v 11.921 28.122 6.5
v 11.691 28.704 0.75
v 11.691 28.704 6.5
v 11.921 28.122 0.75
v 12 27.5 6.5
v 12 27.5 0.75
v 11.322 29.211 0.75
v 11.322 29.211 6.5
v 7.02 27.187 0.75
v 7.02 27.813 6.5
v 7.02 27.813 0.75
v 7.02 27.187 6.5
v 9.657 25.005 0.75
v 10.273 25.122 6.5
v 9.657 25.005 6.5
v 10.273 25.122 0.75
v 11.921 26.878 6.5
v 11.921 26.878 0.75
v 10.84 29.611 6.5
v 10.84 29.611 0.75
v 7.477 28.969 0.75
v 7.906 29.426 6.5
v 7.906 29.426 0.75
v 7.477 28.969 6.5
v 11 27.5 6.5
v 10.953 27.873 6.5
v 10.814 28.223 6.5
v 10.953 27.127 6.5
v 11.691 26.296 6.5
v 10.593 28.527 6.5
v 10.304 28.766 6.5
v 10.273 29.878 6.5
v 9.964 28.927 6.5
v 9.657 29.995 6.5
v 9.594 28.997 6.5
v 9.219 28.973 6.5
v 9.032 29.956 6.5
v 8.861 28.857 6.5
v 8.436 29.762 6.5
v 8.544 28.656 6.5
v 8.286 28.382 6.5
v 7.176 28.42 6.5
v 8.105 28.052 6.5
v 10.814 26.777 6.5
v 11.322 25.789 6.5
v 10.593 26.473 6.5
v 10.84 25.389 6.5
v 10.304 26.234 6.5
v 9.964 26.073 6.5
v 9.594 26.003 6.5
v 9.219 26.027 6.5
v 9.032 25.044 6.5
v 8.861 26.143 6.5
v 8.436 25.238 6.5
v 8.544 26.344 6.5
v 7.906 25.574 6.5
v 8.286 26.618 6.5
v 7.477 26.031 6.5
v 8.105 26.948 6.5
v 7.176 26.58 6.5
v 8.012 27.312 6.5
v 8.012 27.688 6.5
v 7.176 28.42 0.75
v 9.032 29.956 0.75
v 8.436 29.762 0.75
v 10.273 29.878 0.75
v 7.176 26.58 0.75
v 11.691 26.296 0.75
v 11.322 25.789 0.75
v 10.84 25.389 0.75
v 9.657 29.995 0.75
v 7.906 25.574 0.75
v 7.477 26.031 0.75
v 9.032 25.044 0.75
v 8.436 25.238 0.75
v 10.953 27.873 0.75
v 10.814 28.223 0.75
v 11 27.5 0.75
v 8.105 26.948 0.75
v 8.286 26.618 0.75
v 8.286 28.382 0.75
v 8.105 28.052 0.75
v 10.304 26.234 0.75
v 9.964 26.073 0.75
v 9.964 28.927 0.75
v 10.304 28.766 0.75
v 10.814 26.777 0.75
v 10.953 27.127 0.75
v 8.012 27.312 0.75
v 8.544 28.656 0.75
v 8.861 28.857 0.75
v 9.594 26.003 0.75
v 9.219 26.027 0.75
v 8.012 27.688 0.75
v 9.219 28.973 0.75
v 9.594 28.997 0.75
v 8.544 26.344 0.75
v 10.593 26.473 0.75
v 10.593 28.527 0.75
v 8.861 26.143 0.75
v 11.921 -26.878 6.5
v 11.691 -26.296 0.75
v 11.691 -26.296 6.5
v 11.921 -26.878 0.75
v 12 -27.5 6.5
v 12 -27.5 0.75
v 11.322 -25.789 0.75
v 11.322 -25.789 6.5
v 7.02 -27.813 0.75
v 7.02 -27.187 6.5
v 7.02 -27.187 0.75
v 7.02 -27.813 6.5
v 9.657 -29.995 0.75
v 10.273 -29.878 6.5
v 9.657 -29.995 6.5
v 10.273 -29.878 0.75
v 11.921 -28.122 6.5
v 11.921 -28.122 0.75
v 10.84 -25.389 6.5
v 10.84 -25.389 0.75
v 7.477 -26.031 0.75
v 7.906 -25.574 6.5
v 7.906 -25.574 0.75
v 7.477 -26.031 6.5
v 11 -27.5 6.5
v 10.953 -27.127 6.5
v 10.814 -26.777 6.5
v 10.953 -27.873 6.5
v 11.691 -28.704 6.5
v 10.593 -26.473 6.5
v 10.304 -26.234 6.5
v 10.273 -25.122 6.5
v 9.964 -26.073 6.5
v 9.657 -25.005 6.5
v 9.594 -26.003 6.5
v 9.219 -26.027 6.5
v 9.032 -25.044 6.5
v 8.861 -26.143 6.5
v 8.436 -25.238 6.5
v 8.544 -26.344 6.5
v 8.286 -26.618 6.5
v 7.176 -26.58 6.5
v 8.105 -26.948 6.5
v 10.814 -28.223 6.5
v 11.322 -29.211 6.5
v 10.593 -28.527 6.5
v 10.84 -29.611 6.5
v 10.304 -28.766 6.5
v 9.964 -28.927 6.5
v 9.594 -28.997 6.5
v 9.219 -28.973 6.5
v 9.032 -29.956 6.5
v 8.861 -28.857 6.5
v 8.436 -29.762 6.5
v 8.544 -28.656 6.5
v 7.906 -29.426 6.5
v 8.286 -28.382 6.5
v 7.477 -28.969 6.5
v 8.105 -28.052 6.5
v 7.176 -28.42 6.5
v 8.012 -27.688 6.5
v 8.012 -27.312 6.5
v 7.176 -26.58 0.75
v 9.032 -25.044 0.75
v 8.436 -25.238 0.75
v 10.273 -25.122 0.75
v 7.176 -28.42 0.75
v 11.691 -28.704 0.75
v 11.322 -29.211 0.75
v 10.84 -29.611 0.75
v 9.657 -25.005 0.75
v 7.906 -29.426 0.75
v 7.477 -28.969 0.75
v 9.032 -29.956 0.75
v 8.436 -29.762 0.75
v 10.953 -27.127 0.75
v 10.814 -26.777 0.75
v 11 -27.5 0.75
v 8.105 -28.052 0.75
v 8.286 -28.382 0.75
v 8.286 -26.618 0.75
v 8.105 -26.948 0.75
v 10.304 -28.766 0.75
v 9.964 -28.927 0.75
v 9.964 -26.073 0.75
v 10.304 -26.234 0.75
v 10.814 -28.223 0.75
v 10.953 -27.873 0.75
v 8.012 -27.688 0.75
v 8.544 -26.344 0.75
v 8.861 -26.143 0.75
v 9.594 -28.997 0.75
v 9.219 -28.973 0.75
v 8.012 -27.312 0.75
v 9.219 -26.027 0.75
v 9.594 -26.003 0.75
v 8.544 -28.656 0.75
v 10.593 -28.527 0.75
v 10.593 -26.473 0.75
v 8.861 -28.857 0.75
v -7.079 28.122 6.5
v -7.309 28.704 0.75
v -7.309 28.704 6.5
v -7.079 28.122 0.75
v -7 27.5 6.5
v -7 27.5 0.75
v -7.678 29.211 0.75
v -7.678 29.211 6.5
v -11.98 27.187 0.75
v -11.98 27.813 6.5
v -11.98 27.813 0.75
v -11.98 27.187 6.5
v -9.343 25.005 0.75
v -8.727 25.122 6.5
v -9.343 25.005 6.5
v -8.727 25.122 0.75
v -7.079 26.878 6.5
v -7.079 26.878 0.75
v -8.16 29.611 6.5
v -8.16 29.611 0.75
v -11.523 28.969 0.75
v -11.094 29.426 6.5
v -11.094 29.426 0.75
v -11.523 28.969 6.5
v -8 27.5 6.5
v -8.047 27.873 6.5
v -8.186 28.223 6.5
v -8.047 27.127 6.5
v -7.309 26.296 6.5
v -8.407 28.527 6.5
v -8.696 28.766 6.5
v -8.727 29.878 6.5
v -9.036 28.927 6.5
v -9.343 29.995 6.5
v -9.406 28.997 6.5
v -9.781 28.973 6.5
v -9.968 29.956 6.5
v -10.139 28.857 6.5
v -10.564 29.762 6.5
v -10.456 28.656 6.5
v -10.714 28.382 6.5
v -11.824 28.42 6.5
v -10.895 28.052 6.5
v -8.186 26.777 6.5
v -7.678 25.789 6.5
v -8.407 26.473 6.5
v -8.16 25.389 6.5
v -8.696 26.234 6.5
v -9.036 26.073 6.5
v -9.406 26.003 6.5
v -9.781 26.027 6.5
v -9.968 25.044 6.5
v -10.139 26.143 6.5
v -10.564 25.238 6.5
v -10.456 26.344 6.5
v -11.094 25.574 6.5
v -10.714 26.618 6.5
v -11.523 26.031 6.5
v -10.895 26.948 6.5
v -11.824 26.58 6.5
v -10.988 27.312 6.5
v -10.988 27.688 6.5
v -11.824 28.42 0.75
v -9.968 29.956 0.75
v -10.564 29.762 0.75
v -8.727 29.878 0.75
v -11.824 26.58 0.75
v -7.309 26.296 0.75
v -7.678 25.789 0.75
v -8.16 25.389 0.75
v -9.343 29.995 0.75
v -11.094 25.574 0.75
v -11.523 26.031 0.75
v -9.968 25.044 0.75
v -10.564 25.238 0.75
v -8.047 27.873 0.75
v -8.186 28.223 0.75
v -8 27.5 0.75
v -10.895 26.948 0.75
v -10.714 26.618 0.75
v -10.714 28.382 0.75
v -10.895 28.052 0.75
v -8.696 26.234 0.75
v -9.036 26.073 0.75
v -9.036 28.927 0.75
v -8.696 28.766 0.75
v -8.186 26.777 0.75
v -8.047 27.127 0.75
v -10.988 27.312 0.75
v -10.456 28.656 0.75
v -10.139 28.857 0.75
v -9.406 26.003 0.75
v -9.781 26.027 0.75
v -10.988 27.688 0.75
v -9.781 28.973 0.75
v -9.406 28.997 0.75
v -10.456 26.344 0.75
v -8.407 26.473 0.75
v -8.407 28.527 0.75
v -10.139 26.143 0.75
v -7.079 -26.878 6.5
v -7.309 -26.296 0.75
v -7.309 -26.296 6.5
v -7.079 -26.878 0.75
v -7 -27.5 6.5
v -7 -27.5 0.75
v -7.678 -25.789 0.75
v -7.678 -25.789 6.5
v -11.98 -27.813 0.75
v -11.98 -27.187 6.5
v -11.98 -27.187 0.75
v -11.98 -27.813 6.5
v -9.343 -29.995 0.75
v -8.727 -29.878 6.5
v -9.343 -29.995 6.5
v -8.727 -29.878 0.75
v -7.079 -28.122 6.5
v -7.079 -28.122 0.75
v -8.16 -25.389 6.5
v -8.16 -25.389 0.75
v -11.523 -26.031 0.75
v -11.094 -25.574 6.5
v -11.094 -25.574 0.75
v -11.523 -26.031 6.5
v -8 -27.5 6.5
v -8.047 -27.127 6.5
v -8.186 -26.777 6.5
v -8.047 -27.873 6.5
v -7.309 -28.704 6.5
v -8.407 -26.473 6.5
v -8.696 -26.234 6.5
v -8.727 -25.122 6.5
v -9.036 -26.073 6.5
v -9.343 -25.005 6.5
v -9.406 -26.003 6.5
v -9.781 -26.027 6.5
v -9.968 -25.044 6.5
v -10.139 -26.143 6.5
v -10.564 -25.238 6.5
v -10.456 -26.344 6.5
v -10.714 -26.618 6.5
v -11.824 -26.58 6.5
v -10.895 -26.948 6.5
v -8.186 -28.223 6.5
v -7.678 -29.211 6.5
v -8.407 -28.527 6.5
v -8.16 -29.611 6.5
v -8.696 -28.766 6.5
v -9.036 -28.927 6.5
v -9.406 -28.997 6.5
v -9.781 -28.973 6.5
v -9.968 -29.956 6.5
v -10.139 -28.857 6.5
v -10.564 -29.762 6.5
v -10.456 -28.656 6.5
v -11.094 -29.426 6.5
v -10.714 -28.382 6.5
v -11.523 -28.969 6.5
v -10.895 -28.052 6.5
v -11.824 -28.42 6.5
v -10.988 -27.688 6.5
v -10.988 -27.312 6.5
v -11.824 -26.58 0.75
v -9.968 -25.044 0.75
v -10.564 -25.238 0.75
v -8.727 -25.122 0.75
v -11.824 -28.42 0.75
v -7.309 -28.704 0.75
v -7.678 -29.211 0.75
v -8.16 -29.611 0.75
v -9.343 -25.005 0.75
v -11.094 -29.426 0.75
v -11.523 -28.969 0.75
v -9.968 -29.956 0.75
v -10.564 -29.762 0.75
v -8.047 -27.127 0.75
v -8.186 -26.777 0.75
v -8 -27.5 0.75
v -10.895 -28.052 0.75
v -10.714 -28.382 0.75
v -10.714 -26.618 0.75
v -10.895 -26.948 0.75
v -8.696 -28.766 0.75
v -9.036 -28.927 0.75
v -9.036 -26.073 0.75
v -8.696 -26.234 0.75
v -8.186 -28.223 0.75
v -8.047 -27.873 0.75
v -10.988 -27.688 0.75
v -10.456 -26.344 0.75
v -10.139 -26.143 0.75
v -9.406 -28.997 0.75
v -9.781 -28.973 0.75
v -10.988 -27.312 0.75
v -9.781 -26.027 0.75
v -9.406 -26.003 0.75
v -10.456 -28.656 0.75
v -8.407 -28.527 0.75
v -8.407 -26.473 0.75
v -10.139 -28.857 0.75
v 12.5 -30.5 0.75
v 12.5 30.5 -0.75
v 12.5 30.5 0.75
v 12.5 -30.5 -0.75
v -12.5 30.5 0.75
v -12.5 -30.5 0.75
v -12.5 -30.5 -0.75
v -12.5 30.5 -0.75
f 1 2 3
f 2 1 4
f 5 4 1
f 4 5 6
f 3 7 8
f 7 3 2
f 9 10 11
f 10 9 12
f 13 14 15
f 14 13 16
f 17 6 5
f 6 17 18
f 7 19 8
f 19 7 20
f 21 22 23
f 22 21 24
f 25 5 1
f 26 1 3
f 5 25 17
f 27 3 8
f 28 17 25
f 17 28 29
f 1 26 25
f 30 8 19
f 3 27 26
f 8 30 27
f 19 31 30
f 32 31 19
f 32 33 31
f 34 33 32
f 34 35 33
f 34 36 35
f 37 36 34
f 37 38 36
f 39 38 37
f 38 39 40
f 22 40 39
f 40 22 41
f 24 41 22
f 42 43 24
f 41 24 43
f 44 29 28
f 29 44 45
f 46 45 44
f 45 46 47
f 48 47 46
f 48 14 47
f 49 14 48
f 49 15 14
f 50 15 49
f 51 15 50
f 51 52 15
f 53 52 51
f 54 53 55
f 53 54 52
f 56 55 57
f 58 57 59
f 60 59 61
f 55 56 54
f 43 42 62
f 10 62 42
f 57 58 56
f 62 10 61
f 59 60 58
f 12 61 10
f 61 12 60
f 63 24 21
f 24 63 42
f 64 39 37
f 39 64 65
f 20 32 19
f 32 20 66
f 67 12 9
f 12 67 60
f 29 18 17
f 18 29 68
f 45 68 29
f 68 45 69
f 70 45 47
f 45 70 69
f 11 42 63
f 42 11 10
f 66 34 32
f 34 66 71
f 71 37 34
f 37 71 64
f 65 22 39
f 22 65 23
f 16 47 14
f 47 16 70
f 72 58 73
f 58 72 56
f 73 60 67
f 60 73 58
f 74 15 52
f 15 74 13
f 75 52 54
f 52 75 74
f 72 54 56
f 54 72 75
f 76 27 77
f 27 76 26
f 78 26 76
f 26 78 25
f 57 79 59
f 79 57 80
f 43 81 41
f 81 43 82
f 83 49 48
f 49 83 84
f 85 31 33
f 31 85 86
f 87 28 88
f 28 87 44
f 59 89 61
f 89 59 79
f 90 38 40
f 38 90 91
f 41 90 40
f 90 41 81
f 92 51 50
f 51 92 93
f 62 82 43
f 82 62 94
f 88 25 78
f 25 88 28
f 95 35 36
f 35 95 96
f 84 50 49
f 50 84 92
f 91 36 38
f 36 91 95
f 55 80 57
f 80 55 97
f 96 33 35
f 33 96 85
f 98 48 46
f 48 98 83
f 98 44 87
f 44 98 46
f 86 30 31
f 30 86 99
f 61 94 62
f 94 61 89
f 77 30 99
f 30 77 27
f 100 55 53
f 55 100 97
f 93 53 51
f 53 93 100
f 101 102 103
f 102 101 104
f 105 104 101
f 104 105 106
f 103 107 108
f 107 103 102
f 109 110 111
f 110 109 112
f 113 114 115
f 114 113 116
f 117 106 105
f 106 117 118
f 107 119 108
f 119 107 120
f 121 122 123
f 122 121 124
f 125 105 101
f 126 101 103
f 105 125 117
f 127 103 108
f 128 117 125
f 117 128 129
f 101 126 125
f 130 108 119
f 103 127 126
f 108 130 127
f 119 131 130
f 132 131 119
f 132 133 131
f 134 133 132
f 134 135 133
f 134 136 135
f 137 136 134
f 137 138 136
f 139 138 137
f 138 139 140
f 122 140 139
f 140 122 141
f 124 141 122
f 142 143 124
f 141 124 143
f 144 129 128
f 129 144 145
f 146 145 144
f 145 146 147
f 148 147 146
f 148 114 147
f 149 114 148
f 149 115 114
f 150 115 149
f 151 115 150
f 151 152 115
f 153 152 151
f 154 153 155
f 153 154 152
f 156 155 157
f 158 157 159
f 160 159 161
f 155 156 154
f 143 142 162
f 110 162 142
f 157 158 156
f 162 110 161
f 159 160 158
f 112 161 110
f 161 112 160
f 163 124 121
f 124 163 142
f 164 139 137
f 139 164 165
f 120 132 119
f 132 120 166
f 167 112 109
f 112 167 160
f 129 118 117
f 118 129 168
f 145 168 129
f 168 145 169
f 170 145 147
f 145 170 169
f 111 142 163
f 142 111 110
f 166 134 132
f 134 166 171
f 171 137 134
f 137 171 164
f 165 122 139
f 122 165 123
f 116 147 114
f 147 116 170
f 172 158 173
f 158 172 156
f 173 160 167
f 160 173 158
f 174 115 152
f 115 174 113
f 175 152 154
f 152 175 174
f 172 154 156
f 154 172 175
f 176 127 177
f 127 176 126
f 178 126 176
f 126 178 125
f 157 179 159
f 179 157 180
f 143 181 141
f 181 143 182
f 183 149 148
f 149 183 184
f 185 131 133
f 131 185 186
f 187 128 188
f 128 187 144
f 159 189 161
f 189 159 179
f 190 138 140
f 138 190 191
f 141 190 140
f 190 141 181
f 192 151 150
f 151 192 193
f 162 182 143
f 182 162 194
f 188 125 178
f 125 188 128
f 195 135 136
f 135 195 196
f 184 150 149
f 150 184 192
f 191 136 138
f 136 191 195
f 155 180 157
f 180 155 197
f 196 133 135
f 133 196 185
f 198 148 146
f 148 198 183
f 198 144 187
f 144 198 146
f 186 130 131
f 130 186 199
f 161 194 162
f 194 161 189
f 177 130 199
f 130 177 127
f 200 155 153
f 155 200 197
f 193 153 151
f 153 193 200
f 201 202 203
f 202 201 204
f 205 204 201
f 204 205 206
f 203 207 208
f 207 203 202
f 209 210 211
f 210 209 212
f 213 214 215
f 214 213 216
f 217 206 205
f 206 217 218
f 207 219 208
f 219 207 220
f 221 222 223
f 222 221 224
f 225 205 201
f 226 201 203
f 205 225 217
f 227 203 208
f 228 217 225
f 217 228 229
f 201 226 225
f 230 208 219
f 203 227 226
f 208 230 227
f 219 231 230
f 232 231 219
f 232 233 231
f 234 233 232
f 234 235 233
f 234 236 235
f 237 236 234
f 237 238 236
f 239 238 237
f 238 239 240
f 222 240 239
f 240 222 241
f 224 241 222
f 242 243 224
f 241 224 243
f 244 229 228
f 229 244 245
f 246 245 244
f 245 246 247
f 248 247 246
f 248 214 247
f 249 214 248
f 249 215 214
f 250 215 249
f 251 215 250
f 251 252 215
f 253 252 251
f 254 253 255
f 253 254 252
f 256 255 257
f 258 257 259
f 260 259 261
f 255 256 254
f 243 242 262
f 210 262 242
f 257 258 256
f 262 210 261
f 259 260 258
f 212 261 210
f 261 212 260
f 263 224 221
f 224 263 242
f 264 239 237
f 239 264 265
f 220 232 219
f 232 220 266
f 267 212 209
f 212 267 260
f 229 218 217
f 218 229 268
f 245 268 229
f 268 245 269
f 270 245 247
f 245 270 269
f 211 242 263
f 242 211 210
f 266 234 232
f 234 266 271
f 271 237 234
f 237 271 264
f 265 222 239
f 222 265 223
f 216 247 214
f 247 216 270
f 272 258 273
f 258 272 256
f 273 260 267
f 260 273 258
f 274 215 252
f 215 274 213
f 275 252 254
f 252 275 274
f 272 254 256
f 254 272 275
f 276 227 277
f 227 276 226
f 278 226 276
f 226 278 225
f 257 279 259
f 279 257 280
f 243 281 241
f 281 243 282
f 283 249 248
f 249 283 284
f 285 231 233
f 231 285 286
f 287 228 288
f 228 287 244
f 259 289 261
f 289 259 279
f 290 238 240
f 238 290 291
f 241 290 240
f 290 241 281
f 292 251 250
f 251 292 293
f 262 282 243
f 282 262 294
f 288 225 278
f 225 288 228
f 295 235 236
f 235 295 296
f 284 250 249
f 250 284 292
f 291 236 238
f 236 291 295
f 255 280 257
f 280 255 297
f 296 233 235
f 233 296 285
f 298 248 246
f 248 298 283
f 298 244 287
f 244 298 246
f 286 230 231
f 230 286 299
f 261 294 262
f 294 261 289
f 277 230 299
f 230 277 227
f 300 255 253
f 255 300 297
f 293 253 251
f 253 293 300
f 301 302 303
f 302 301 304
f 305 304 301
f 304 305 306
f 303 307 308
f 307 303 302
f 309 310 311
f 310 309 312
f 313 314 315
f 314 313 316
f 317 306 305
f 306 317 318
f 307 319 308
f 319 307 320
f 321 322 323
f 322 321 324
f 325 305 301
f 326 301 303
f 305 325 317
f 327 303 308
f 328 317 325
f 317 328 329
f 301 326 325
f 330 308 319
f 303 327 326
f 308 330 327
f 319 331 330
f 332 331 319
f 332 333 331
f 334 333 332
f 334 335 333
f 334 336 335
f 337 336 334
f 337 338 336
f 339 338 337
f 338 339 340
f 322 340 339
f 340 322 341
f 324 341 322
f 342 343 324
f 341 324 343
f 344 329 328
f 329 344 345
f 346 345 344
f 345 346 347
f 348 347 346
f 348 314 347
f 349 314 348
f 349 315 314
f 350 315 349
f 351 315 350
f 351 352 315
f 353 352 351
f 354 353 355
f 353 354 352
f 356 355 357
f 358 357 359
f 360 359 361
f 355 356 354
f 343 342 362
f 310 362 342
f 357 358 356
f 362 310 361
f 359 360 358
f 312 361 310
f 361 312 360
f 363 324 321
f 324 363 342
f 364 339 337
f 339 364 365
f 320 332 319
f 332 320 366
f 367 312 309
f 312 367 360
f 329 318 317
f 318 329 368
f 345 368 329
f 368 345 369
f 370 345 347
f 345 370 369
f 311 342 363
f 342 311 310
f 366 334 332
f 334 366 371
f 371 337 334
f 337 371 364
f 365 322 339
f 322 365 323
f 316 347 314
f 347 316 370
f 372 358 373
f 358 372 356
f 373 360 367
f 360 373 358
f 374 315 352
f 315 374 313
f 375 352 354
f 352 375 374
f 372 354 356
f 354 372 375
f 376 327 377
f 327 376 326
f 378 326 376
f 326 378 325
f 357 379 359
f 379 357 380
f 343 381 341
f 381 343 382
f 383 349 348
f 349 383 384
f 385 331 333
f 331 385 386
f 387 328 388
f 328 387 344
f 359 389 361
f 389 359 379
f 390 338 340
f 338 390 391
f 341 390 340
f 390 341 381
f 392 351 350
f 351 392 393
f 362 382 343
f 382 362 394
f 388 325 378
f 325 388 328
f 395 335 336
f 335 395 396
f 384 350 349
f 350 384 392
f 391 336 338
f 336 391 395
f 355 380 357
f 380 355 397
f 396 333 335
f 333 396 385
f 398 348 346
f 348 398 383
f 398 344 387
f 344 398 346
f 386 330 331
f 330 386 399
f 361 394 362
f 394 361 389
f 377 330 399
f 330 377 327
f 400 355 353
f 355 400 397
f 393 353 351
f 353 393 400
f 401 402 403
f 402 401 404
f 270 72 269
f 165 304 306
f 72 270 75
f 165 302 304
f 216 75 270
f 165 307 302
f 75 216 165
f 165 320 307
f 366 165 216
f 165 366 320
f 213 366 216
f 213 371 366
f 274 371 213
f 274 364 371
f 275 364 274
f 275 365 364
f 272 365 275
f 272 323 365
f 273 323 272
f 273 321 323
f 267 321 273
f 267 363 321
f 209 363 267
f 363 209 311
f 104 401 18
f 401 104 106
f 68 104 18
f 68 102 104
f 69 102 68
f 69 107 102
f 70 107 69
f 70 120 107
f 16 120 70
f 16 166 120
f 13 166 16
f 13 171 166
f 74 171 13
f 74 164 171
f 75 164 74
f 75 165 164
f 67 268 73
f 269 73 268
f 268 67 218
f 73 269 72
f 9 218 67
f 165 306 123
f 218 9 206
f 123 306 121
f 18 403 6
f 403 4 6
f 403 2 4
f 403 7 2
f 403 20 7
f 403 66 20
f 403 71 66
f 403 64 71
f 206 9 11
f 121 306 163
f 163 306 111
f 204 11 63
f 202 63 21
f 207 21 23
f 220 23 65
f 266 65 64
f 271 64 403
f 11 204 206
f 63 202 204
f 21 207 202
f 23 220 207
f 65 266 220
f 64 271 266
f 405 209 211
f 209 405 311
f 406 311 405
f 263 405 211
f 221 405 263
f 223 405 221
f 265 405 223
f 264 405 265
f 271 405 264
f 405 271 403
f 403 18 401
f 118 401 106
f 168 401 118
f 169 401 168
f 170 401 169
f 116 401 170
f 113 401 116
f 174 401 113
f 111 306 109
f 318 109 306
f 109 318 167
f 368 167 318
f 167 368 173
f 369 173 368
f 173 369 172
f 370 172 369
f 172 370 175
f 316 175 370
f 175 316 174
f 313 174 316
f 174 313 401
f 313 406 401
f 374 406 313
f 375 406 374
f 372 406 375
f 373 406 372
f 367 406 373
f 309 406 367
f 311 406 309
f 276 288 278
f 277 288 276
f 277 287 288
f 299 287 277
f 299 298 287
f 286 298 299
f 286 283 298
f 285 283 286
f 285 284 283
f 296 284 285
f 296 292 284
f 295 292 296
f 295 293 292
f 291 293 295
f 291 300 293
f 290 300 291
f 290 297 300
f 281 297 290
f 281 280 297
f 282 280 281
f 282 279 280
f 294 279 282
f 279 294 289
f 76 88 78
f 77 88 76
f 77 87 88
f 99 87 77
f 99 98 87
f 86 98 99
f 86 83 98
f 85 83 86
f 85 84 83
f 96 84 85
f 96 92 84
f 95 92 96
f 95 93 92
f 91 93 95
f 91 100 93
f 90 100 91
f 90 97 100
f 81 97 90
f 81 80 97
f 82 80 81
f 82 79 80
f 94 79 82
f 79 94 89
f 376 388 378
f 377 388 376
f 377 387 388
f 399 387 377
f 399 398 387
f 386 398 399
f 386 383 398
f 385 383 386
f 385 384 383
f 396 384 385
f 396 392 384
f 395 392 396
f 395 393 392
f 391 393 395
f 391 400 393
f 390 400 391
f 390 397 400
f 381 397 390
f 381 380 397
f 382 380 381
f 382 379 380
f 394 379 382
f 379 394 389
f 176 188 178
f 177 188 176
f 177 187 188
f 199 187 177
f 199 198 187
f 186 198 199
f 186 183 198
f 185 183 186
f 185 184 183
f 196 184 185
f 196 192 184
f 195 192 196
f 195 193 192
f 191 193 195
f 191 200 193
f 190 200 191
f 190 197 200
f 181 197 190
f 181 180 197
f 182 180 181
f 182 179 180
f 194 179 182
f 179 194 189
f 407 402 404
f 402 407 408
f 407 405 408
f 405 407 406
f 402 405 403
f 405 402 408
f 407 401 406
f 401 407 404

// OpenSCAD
$fn = 25;

Width   = 23;
Length  = 59;
Thick   = 1.5;

// Methods
module Post (x, y, h) {    
    translate ([x, y, 0])
    difference () {
		cylinder (r = 2.5, h = h);
		cylinder (r = 1.5, h = h + 1);
	}
}

Post ( (Width / 2 - 2),  (Length / 2 - 2), Thick + 5);
Post ( (Width / 2 - 2), -(Length / 2 - 2), Thick + 5);
Post (-(Width / 2 - 2),  (Length / 2 - 2), Thick + 5);
Post (-(Width / 2 - 2), -(Length / 2 - 2), Thick + 5);

difference() {
    translate([0, 0, 0]) 
    cube ([Width + 2, Length + 2, Thick], center = true);
}
